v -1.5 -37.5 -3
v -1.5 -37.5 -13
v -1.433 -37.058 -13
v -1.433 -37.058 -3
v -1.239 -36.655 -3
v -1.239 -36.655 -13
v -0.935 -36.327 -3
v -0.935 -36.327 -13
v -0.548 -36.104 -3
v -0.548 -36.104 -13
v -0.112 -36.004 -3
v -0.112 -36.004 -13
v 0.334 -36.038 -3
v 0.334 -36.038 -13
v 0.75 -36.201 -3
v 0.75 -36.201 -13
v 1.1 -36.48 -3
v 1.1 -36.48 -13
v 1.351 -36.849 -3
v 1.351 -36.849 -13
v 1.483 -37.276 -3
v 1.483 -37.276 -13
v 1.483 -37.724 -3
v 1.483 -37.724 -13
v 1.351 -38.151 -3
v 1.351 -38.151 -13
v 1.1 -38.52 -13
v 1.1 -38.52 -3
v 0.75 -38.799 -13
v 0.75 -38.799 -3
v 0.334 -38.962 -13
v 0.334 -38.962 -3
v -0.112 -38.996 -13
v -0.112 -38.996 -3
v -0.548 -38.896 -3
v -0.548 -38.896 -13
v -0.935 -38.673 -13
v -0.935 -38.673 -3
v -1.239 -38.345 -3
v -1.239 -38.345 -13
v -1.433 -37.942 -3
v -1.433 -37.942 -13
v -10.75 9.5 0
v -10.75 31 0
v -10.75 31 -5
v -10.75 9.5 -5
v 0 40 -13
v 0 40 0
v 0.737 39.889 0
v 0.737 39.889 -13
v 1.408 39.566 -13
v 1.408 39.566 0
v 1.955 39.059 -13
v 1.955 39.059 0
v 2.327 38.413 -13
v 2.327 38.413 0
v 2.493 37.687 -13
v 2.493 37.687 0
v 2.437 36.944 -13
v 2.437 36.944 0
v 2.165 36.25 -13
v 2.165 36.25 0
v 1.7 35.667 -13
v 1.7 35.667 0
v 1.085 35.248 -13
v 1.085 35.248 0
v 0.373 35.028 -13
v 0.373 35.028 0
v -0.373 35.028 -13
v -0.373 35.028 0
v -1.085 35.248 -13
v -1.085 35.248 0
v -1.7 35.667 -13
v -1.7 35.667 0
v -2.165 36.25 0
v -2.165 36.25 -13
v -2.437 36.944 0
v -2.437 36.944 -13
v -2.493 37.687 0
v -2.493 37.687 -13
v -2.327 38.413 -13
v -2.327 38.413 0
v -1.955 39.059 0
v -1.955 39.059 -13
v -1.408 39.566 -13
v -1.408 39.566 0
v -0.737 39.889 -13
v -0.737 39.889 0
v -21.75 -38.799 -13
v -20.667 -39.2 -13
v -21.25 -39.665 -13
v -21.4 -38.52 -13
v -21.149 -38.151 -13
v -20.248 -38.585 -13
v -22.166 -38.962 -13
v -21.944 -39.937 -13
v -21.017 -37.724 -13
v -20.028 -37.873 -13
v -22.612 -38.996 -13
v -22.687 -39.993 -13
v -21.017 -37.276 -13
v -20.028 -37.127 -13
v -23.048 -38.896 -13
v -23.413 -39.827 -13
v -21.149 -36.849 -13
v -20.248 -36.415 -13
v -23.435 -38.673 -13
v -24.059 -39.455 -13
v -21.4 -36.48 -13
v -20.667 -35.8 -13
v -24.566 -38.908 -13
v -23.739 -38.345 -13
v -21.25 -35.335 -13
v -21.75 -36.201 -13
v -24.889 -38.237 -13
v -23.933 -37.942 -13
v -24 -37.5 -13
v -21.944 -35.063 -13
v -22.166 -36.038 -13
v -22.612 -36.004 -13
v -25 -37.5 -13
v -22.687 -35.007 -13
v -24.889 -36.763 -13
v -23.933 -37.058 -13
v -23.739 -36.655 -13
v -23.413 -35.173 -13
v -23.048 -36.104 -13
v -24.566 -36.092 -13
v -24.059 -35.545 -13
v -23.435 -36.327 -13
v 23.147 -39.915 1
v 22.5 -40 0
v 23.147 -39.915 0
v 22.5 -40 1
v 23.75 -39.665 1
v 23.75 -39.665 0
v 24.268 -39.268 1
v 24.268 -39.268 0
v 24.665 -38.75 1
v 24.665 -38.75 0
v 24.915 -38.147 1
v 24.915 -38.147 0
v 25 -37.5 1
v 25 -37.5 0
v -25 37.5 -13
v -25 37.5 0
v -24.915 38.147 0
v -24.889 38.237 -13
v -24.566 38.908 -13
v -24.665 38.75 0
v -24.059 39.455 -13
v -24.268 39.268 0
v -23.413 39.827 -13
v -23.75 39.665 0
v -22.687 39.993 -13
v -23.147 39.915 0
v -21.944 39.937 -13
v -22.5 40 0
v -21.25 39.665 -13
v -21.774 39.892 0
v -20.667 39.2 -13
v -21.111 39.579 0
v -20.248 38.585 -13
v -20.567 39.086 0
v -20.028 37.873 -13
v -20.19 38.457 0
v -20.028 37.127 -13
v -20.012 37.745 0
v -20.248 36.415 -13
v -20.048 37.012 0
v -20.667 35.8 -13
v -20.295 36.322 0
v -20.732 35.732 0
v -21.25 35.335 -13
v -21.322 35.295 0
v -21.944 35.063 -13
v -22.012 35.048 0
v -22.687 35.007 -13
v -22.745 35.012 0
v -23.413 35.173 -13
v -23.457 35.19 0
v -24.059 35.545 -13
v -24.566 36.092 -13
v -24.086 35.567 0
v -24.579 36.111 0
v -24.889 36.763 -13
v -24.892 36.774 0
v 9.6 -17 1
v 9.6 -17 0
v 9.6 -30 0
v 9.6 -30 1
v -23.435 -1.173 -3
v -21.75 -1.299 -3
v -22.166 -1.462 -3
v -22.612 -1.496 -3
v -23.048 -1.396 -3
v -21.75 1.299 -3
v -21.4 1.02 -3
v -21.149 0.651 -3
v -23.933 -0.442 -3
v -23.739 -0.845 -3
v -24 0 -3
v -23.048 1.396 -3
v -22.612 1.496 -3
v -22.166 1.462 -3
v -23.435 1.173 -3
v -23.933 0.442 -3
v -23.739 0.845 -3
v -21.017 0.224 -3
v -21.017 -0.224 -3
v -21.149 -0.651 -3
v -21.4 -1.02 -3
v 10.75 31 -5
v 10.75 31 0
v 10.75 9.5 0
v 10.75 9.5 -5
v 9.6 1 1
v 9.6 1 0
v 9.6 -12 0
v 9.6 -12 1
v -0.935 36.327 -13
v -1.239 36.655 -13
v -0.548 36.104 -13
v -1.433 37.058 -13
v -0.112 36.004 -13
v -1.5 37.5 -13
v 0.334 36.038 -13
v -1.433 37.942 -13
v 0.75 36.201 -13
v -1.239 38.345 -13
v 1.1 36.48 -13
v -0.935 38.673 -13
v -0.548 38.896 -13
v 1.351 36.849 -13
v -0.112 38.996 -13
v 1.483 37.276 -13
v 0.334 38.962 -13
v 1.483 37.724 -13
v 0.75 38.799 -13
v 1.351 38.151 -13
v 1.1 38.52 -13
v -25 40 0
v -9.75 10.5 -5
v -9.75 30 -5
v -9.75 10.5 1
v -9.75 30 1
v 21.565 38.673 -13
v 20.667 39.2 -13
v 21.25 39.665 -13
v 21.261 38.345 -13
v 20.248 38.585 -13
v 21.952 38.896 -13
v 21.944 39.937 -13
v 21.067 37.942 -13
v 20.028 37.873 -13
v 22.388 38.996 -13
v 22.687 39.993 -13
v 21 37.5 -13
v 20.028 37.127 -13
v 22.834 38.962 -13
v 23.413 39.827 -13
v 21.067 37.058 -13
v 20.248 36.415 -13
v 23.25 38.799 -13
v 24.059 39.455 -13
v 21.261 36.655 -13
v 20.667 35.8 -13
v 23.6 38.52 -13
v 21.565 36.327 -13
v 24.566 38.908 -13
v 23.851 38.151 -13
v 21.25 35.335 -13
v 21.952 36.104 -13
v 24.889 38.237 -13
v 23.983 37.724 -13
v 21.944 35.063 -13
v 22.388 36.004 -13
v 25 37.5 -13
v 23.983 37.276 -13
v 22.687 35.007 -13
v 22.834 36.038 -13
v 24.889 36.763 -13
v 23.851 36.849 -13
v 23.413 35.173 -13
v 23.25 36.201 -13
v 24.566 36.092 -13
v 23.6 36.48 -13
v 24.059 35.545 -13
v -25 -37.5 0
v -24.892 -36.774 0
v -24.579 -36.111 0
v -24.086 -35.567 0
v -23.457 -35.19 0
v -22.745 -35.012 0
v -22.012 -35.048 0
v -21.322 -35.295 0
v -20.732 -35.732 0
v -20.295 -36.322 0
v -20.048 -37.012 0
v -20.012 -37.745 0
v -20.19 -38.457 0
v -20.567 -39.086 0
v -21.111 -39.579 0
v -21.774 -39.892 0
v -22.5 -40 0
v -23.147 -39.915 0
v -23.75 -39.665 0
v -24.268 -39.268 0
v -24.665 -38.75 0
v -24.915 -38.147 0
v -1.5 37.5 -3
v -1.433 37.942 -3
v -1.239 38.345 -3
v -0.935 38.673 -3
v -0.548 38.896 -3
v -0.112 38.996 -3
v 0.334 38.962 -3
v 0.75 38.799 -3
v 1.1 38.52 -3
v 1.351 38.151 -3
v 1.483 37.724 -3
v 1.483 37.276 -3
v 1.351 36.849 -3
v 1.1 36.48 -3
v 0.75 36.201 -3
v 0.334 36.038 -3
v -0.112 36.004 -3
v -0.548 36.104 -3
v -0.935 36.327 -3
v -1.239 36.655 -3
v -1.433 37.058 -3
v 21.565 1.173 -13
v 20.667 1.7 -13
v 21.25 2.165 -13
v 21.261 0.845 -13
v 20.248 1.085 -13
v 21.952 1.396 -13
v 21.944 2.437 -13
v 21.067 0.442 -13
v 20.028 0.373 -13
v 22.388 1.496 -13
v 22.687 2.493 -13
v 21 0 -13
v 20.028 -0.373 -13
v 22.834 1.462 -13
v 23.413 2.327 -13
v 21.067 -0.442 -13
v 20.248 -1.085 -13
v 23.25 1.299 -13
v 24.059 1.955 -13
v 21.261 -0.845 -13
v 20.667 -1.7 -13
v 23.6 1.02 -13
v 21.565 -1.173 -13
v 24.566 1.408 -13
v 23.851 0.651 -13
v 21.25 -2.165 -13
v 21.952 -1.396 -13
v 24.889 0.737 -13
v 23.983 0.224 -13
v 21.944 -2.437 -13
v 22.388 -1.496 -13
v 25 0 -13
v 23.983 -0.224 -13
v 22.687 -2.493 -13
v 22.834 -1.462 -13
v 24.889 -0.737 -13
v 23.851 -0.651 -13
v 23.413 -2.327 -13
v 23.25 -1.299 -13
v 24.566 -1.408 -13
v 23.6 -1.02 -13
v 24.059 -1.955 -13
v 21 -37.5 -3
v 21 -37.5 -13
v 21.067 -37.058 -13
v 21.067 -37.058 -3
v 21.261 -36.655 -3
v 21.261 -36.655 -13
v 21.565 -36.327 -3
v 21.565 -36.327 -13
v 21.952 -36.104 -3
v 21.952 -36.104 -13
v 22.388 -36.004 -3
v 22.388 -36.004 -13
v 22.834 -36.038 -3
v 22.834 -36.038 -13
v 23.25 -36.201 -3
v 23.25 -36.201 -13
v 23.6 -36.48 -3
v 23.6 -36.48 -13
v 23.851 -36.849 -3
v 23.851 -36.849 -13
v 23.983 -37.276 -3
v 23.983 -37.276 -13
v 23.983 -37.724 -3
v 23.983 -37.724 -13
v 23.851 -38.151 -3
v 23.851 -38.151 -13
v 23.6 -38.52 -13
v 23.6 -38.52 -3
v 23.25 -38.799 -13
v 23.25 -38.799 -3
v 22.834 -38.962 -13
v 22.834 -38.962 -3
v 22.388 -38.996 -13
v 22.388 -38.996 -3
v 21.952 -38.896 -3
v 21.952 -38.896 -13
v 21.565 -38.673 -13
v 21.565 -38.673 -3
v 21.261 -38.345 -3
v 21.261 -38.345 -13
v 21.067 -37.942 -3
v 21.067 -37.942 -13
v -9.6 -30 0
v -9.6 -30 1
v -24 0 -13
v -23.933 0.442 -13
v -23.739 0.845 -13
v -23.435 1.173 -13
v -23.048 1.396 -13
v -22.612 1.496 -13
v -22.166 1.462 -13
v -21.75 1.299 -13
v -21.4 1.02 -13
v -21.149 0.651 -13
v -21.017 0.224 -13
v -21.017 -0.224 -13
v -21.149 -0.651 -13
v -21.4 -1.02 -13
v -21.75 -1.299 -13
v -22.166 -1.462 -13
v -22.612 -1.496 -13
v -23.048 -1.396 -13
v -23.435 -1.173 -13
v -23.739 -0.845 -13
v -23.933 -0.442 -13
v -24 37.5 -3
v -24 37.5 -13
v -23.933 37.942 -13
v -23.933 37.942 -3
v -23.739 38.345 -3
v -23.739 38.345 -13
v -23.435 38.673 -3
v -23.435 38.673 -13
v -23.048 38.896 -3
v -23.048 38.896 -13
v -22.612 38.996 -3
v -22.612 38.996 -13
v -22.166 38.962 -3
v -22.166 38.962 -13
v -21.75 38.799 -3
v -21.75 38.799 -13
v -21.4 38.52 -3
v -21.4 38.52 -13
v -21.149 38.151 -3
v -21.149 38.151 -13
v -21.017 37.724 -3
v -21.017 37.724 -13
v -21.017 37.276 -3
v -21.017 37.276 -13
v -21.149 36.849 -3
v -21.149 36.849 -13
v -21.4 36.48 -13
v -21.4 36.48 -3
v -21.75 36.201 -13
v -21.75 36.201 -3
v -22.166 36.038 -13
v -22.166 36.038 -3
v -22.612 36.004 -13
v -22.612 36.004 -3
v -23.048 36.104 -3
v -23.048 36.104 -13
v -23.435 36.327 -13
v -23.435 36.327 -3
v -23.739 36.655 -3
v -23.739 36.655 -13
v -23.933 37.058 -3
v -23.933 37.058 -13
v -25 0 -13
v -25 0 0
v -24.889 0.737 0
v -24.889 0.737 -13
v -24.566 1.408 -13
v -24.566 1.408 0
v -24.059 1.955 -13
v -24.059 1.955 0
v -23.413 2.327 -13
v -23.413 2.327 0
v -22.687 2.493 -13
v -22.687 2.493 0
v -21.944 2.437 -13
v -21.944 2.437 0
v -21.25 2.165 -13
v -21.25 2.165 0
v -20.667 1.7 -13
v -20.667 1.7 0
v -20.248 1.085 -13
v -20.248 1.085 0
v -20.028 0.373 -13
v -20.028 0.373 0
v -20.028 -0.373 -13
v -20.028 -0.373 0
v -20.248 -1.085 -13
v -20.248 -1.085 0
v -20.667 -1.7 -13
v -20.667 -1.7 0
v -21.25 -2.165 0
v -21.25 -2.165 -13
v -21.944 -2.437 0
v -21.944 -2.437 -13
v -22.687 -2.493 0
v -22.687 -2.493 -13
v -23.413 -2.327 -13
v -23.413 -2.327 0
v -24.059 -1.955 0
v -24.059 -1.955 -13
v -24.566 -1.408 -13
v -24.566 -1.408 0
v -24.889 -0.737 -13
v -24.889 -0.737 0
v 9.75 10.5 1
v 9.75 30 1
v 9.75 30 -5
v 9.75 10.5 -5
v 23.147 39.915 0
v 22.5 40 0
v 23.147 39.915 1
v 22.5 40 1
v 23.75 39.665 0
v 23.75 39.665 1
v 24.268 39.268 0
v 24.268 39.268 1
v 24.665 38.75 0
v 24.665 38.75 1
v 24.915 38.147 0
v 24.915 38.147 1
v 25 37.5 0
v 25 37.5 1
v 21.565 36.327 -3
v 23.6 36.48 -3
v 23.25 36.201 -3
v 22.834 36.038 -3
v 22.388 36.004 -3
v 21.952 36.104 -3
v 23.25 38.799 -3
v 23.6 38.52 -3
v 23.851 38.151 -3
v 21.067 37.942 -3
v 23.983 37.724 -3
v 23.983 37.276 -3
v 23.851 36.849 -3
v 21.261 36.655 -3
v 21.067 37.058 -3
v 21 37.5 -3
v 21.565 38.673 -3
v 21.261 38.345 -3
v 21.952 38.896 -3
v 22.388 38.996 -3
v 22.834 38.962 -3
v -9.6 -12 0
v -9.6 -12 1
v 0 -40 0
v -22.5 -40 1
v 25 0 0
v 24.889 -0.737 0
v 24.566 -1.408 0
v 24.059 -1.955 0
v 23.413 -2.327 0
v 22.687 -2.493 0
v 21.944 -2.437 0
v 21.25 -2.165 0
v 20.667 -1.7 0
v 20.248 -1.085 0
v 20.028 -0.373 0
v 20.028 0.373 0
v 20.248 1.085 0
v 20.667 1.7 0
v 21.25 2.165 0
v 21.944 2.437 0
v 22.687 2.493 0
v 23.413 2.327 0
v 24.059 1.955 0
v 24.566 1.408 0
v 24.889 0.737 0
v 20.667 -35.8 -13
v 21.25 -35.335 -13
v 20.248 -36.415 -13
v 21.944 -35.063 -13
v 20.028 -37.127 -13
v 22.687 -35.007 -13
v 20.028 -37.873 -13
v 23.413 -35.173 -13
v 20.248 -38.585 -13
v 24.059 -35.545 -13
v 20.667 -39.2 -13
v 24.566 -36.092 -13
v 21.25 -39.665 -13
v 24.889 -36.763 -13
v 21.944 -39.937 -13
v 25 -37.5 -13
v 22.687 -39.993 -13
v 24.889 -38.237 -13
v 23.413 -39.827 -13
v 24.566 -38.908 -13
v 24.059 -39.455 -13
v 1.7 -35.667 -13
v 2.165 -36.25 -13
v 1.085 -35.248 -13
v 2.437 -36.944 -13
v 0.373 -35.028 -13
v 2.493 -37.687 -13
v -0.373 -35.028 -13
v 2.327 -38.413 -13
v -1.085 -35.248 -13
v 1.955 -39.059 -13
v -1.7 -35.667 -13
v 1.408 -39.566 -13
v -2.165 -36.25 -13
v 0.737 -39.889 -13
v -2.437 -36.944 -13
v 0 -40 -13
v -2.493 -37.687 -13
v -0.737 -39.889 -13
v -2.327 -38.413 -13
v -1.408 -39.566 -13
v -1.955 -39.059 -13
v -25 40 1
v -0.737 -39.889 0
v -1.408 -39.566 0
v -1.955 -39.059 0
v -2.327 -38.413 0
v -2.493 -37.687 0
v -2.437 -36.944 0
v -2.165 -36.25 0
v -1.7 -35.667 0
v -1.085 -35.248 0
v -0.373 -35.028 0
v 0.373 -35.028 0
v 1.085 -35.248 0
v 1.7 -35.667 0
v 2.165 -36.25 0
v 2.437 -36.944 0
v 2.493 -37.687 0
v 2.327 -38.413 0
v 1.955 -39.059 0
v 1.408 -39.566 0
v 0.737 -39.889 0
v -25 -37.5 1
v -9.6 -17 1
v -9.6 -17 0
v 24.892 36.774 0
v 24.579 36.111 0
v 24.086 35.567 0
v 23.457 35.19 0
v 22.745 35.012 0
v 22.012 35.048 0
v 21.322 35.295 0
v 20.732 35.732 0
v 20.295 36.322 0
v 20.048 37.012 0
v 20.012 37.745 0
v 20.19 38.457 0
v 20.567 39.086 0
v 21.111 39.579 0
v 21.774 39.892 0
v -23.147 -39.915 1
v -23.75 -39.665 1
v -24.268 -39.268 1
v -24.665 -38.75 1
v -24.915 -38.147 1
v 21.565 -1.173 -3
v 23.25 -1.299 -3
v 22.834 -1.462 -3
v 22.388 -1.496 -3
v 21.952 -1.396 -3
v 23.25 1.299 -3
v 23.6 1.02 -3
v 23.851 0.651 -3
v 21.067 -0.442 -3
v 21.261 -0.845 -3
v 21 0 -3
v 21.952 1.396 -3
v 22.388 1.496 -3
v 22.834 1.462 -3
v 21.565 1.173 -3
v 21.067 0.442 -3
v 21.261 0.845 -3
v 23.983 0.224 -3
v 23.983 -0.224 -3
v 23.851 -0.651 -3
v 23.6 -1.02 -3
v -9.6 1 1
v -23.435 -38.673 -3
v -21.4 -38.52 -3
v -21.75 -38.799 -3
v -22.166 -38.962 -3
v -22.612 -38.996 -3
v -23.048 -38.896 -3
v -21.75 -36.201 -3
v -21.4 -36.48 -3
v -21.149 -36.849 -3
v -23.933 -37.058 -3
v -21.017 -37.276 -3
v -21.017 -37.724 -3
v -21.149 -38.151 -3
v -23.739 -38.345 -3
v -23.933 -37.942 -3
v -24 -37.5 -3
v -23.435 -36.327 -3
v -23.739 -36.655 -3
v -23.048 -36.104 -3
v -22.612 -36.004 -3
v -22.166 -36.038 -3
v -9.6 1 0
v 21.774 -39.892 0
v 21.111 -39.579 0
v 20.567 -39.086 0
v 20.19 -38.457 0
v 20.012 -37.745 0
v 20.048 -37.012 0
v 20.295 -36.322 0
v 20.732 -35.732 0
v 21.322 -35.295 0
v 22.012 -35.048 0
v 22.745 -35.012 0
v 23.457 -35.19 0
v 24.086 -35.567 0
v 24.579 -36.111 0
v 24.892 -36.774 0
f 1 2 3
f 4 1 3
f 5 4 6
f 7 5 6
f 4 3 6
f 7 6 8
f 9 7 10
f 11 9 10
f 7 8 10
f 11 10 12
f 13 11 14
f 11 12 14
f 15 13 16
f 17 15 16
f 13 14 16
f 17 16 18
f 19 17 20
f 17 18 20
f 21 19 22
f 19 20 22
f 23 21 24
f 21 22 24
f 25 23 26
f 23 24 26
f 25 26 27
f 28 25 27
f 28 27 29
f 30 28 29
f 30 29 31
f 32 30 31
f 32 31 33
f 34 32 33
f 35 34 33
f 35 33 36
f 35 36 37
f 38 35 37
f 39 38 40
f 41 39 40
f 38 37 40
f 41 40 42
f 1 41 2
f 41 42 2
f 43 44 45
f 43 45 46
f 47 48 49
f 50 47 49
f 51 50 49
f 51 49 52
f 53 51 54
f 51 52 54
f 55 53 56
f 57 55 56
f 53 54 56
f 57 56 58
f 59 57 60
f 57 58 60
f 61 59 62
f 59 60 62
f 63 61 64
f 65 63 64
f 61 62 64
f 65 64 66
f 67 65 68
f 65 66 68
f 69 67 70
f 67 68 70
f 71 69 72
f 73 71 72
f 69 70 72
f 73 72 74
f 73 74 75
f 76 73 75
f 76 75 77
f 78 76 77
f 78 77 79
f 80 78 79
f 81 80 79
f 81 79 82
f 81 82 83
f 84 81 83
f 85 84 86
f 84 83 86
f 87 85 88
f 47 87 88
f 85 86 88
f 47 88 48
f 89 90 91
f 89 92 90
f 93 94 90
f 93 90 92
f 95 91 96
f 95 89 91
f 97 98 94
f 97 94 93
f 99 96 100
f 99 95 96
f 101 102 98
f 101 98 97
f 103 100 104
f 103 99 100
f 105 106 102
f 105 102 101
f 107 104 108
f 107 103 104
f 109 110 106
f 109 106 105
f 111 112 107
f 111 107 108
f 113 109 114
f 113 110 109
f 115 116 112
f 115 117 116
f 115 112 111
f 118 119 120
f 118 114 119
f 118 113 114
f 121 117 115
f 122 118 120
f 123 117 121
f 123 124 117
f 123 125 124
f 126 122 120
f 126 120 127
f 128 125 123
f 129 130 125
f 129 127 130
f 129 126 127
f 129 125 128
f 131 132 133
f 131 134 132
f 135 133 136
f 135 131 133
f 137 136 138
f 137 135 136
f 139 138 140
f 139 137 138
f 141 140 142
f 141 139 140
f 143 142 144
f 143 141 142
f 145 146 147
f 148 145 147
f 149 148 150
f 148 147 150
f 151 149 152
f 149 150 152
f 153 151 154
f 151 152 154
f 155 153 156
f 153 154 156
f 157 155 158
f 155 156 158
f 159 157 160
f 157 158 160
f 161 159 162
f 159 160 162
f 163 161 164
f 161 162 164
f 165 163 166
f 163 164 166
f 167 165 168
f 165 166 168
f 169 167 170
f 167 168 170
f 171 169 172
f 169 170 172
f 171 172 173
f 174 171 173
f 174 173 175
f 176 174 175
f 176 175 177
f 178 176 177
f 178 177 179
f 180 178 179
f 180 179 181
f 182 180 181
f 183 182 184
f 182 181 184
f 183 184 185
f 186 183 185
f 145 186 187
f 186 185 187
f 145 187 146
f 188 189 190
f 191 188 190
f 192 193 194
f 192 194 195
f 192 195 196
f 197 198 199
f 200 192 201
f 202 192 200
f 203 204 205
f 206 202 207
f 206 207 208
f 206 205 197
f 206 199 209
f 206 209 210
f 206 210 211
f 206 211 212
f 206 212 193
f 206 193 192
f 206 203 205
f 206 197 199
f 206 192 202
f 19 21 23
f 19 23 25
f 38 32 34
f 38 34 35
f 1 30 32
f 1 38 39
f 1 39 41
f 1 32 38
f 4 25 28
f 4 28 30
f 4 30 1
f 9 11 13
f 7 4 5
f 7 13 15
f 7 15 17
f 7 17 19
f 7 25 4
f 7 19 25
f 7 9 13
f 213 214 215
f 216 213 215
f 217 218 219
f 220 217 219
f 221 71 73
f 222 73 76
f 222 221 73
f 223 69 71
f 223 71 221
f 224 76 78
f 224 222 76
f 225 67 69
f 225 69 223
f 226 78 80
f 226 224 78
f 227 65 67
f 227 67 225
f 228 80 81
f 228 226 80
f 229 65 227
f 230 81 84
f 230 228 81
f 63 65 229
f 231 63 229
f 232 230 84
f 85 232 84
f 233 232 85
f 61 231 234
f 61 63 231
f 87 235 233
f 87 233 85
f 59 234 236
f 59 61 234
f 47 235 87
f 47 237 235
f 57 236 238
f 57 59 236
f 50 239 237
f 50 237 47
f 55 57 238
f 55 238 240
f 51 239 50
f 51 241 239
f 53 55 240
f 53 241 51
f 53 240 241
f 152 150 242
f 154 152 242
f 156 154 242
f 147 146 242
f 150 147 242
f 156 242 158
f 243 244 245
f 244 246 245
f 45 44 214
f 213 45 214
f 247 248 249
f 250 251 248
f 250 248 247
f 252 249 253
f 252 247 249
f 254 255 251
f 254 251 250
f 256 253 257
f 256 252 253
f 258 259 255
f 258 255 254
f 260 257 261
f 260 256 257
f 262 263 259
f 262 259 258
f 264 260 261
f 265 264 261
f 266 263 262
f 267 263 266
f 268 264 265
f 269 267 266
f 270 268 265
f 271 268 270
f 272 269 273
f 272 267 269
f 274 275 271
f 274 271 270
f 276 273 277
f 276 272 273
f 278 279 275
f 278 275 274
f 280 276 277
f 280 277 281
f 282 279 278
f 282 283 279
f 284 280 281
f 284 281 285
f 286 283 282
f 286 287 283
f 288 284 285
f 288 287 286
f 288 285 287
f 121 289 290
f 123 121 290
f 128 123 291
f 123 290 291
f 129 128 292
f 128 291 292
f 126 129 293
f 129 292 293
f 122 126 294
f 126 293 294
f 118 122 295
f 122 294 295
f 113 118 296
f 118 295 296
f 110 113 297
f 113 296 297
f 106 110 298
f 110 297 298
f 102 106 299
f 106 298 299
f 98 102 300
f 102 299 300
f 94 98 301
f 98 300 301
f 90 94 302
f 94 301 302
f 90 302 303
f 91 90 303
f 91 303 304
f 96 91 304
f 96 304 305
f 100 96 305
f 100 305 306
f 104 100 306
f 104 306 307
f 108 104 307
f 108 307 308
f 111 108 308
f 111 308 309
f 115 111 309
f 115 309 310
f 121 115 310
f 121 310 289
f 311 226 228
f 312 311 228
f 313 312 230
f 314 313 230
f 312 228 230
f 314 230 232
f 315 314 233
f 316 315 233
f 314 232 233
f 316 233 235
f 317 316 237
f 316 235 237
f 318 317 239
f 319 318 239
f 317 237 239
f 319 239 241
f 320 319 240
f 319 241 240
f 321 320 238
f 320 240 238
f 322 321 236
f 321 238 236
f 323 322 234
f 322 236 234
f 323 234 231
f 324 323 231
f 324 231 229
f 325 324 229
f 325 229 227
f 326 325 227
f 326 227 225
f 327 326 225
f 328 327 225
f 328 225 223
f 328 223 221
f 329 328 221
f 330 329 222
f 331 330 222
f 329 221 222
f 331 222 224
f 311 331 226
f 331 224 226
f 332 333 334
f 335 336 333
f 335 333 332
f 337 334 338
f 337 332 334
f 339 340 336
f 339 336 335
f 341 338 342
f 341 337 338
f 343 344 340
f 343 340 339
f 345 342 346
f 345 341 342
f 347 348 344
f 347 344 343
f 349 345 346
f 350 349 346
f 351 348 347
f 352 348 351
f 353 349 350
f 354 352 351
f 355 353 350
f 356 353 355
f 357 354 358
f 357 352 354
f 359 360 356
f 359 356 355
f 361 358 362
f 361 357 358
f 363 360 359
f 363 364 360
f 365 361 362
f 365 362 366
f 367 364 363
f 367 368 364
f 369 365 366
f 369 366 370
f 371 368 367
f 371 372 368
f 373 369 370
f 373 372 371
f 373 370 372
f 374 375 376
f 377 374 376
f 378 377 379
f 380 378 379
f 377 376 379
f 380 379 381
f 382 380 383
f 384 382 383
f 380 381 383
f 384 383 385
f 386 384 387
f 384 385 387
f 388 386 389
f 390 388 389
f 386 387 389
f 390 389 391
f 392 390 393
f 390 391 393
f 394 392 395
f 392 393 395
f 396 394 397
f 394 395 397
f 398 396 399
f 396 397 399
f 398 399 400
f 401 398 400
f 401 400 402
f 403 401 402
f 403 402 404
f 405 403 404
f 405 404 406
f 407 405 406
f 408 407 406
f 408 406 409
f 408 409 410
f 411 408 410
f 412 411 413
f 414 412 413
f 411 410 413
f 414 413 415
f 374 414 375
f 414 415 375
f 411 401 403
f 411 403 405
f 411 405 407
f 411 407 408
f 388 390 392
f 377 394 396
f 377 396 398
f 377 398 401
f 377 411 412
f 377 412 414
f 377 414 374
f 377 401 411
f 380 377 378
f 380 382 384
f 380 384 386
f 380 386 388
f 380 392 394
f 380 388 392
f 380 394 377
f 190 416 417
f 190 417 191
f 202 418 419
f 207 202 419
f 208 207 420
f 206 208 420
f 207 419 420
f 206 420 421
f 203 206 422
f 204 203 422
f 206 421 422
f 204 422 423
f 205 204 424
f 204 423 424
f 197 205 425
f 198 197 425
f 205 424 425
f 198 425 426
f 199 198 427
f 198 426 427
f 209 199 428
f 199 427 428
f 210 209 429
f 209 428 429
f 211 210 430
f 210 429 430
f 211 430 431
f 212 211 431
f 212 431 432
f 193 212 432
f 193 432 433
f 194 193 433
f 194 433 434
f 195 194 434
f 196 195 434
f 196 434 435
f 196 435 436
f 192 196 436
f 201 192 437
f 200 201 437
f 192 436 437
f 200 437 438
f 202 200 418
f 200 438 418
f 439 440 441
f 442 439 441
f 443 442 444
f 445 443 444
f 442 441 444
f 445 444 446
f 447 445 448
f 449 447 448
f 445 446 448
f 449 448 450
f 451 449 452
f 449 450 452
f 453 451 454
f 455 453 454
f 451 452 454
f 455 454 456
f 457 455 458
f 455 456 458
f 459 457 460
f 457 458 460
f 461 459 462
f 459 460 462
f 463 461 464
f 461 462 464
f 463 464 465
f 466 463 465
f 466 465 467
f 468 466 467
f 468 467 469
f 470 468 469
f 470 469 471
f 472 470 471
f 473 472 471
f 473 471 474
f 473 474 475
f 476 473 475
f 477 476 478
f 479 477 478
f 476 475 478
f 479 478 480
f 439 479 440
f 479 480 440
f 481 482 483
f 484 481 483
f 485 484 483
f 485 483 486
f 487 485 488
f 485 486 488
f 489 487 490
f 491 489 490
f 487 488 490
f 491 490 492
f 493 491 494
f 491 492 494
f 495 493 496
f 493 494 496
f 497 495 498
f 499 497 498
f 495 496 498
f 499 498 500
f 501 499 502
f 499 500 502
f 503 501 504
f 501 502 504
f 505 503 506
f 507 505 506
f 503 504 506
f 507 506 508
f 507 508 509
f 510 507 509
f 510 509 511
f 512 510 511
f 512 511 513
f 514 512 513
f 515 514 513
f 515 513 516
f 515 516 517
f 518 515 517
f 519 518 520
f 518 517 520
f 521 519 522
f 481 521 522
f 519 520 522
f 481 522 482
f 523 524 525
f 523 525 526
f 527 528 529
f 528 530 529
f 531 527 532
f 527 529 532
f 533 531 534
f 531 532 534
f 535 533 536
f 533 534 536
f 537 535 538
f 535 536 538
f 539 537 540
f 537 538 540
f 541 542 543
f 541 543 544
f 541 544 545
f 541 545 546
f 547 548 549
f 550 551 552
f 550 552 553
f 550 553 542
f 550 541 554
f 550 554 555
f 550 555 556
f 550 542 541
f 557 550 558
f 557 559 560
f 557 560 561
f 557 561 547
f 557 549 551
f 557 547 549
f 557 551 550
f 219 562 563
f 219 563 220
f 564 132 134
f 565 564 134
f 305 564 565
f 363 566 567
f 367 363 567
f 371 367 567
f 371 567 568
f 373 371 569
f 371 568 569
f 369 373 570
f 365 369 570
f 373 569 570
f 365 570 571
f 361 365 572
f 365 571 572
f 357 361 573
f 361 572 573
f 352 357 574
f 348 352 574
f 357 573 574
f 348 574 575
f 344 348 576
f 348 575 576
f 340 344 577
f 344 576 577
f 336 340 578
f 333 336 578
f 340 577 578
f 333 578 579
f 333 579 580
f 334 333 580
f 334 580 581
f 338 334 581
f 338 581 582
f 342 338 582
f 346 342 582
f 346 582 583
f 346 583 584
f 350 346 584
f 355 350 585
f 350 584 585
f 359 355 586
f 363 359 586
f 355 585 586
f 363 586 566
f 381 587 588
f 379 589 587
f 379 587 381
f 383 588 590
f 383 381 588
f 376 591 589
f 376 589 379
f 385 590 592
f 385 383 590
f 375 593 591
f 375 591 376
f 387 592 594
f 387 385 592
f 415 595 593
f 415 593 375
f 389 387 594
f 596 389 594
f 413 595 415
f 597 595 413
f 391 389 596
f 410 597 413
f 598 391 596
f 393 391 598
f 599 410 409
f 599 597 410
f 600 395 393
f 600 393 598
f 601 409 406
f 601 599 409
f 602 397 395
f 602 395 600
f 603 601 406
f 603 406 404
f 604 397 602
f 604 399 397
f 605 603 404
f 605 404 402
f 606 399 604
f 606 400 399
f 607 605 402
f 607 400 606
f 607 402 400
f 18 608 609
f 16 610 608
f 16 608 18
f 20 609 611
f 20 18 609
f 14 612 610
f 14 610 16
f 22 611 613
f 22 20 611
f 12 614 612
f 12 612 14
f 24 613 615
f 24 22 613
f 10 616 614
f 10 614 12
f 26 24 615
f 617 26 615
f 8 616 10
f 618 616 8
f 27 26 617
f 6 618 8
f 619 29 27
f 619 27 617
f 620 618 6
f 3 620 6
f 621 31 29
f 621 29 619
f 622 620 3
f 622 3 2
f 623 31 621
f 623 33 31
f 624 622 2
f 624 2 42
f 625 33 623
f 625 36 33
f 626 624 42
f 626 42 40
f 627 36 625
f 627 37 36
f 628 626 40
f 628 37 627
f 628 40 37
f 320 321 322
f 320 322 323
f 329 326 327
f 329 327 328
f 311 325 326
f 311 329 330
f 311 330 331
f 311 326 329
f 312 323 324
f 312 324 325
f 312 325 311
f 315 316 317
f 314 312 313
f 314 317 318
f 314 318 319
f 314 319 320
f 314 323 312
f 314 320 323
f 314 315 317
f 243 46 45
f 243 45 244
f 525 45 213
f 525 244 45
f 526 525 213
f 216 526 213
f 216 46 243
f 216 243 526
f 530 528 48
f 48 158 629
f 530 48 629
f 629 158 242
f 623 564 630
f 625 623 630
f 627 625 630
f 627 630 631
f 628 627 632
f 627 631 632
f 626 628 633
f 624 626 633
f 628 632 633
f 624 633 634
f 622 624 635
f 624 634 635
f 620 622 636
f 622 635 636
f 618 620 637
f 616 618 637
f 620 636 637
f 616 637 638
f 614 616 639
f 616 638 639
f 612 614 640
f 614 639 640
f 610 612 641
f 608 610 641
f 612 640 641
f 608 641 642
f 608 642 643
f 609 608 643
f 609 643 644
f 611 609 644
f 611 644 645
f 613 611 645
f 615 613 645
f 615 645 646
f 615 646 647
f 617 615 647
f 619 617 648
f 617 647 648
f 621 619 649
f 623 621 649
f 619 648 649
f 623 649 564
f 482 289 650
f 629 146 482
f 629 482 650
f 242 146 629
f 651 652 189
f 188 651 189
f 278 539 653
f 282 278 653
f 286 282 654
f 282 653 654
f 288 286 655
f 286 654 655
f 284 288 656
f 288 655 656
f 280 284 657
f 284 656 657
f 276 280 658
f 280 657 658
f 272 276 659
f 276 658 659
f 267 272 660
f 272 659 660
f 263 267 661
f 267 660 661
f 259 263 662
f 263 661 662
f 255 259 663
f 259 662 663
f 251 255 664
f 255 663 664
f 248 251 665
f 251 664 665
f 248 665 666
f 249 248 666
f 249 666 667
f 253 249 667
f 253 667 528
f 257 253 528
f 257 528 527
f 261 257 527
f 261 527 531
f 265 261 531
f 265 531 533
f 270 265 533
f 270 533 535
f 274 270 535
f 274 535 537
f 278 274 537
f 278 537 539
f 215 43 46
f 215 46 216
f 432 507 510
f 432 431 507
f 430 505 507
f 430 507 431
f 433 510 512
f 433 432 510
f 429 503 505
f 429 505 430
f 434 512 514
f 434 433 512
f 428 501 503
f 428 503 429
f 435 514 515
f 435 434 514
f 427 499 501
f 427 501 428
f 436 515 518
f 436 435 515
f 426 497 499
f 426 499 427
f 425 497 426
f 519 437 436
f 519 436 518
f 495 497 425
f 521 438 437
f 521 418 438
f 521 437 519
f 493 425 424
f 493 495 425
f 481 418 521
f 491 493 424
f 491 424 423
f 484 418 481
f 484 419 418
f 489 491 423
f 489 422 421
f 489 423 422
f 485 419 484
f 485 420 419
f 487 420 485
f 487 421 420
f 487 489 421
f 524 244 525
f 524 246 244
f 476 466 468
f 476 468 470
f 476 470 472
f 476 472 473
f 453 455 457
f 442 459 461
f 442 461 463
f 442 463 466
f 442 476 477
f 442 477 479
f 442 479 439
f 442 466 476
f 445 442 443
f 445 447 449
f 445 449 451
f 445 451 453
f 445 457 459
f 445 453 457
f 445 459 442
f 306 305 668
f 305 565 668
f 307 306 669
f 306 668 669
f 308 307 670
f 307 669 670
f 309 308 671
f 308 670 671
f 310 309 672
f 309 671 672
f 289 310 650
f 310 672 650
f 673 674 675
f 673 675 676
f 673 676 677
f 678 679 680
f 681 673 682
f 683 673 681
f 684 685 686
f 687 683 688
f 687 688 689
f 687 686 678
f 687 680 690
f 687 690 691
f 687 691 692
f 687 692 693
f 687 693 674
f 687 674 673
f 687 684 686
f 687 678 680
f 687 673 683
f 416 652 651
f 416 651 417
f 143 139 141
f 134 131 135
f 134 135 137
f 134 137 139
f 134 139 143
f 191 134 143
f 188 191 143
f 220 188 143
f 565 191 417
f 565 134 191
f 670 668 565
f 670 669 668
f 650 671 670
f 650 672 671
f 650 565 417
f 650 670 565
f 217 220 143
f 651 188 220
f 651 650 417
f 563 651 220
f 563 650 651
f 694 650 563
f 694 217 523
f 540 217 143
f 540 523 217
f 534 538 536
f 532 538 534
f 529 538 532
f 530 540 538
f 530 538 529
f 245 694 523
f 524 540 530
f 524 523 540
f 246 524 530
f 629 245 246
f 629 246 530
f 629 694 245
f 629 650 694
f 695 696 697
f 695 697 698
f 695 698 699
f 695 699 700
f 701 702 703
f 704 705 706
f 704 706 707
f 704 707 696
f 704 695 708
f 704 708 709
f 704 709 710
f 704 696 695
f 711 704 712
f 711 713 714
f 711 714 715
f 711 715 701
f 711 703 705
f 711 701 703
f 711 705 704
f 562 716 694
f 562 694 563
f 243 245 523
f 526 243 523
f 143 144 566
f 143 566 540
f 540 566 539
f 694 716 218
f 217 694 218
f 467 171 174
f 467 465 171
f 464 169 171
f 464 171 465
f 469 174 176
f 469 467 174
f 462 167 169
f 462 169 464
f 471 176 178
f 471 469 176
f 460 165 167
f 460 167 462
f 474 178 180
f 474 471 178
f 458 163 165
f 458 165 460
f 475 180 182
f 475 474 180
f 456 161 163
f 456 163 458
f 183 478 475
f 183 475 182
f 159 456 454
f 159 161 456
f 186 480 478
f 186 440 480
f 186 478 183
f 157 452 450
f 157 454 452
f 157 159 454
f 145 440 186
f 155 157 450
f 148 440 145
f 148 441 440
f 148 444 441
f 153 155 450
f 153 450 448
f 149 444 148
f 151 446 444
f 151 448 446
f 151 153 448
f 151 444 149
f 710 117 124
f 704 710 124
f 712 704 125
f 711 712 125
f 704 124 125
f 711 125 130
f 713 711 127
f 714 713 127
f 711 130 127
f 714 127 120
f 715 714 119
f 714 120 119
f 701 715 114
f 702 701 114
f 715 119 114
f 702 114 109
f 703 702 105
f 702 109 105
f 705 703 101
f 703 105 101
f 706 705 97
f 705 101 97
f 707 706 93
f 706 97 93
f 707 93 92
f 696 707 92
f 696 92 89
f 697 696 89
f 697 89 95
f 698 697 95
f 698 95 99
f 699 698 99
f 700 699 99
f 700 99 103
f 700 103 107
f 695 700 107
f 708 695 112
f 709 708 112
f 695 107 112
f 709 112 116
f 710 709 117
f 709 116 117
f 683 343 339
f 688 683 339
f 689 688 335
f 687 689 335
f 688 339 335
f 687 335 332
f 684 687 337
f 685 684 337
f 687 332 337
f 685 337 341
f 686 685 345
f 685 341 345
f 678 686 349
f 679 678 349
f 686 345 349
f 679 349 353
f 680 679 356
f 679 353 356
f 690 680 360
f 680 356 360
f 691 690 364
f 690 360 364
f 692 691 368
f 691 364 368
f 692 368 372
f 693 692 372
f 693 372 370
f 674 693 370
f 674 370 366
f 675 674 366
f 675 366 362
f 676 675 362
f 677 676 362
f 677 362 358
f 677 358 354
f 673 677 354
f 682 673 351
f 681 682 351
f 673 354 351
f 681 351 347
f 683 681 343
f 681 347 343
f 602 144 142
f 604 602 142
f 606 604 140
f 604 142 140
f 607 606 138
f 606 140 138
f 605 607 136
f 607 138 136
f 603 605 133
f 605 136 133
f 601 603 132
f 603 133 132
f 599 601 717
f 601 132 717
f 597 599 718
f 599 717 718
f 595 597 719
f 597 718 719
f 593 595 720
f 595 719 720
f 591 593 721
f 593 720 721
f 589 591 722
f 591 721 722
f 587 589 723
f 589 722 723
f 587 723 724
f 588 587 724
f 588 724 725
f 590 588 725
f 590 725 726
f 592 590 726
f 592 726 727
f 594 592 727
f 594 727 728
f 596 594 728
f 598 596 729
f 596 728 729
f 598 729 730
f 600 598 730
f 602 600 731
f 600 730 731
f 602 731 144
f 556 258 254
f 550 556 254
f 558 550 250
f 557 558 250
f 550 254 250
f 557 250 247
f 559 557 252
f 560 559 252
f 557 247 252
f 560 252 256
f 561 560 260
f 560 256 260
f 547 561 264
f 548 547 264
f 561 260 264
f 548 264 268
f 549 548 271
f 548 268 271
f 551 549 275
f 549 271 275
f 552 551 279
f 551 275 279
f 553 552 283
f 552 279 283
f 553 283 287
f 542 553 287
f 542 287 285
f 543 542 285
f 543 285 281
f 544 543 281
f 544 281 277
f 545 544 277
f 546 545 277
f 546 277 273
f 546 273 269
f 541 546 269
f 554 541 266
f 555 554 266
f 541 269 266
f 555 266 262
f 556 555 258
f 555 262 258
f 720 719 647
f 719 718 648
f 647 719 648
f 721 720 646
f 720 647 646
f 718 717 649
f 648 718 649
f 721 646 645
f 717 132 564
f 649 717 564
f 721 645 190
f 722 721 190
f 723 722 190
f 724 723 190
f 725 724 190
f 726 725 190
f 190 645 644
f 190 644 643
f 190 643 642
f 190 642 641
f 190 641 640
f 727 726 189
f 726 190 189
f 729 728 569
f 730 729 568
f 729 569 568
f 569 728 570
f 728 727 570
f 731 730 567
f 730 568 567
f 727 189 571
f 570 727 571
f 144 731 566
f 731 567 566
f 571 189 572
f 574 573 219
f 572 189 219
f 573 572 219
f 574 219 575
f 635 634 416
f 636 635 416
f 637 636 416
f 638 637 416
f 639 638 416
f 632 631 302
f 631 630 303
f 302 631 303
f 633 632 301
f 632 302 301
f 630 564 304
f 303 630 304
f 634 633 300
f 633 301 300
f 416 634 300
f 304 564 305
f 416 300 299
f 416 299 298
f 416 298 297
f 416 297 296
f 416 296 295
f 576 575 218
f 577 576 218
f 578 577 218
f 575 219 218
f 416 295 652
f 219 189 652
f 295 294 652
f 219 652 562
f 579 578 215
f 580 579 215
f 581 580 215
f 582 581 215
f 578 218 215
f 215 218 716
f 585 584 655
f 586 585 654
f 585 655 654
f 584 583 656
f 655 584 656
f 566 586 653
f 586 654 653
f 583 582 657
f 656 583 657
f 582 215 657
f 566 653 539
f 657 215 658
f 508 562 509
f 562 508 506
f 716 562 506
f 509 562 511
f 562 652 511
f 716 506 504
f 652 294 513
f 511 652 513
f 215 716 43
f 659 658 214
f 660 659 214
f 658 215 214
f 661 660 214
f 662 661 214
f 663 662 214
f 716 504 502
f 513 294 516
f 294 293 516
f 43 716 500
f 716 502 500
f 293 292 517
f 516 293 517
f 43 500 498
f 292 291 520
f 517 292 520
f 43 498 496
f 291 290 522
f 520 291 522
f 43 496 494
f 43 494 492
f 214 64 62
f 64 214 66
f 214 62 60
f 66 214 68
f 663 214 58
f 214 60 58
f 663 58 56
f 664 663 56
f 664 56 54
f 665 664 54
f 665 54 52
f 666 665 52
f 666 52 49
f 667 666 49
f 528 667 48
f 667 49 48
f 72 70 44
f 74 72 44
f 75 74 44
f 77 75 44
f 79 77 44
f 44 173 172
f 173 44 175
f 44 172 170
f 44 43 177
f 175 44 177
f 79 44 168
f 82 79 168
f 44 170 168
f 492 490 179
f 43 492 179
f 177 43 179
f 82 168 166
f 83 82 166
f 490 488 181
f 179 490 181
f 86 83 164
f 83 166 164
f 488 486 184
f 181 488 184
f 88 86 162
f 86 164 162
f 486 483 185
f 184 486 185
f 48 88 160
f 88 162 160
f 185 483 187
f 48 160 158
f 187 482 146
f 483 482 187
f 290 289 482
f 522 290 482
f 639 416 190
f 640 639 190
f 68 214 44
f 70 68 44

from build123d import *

# Parameters (mm, degrees)
SKETCH1_W           = 80
SKETCH1_H           = 50
BOSS_EXTRUDE1_DEPTH = 1
SKETCH4_W           = 19.2
SKETCH4_H           = 13
SKETCH4_W_2         = 19.5
SKETCH4_H_2         = 19.5
CUT_EXTRUDE1_DEPTH  = 1
SKETCH5_R           = 2.5
BOSS_EXTRUDE2_DEPTH = 13
FILLET1_R           = 2.5
SKETCH6_W           = 21.5
SKETCH6_H           = 21.5
SKETCH6_W_2         = 19.5
SKETCH6_H_2         = 19.5
BOSS_EXTRUDE3_DEPTH = 5
SKETCH7_R           = 1.5
CUT_EXTRUDE2_DEPTH  = 10


with BuildPart() as part:
    # Sketch1 → Boss-Extrude1 (new body)
    with BuildSketch(Plane(origin=(0, 0, 0), x_dir=(0, 1, 0), z_dir=(0, 0, 1))):
        Rectangle(SKETCH1_W, SKETCH1_H)
    extrude(amount=BOSS_EXTRUDE1_DEPTH)

    # Sketch4 → Cut-Extrude1 (cut)
    with BuildSketch(Plane(origin=(0, 0, 0), x_dir=(1, 0, 0), z_dir=(0, 0, -1))):
        with Locations((0, 23.5)):
            Rectangle(SKETCH4_W, SKETCH4_H)
        with Locations((0, 5.5)):
            Rectangle(SKETCH4_W, SKETCH4_H)
        with Locations((0, -20.25)):
            Rectangle(SKETCH4_W_2, SKETCH4_H_2)
    extrude(amount=-CUT_EXTRUDE1_DEPTH, mode=Mode.SUBTRACT)

    # Sketch5 → Boss-Extrude2 (add)
    with BuildSketch(Plane(origin=(0, 0, 0), x_dir=(1, 0, 0), z_dir=(0, 0, -1))):
        with Locations(Location((0, 37.5, 0), (0, 0, 90))):
            Circle(SKETCH5_R)
        with Locations(Location((-22.5, 37.5, 0), (0, 0, 180))):
            Circle(SKETCH5_R)
        with Locations((22.5, 37.5)):
            Circle(SKETCH5_R)
        with Locations(Location((-22.5, 0, 0), (0, 0, 180))):
            Circle(SKETCH5_R)
        with Locations((22.5, 0)):
            Circle(SKETCH5_R)
        with Locations((22.5, -37.5)):
            Circle(SKETCH5_R)
        with Locations(Location((-22.5, -37.5, 0), (0, 0, 180))):
            Circle(SKETCH5_R)
        with Locations(Location((0, -37.5, 0), (0, 0, 270))):
            Circle(SKETCH5_R)
    extrude(amount=BOSS_EXTRUDE2_DEPTH)

    # Fillet1
    fillet1_edges = [part.edges().sort_by_distance(p)[0] for p in [
        (25, 40, 0.5),
        (25, -40, 0.5),
        (-25, -40, 0.5),
    ]]
    fillet(fillet1_edges, radius=FILLET1_R - 0.0001)  # a hair under: the kernel refuses the full size

    # Sketch6 → Boss-Extrude3 (add)
    with BuildSketch(Plane(origin=(0, 0, 0), x_dir=(1, 0, 0), z_dir=(0, 0, -1))):
        with Locations((0, -20.25)):
            Rectangle(SKETCH6_W, SKETCH6_H)
        with Locations((0, -20.25)):
            Rectangle(SKETCH6_W_2, SKETCH6_H_2, mode=Mode.SUBTRACT)
    extrude(amount=BOSS_EXTRUDE3_DEPTH)

    # Sketch7 → Cut-Extrude2 (cut)
    with BuildSketch(Plane(origin=(0, 0, -13), x_dir=(1, 0, 0), z_dir=(0, 0, -1))):
        with Locations(Location((-22.5, 37.5, 0), (0, 0, 180))):
            Circle(SKETCH7_R)
        with Locations(Location((0, 37.5, 0), (0, 0, 180))):
            Circle(SKETCH7_R)
        with Locations(Location((22.5, 37.5, 0), (0, 0, 180))):
            Circle(SKETCH7_R)
        with Locations(Location((-22.5, 0, 0), (0, 0, 180))):
            Circle(SKETCH7_R)
        with Locations(Location((22.5, 0, 0), (0, 0, 180))):
            Circle(SKETCH7_R)
        with Locations(Location((22.5, -37.5, 0), (0, 0, 180))):
            Circle(SKETCH7_R)
        with Locations(Location((0, -37.5, 0), (0, 0, 180))):
            Circle(SKETCH7_R)
        with Locations(Location((-22.5, -37.5, 0), (0, 0, 180))):
            Circle(SKETCH7_R)
    extrude(amount=-CUT_EXTRUDE2_DEPTH, mode=Mode.SUBTRACT)


solid = part.part
